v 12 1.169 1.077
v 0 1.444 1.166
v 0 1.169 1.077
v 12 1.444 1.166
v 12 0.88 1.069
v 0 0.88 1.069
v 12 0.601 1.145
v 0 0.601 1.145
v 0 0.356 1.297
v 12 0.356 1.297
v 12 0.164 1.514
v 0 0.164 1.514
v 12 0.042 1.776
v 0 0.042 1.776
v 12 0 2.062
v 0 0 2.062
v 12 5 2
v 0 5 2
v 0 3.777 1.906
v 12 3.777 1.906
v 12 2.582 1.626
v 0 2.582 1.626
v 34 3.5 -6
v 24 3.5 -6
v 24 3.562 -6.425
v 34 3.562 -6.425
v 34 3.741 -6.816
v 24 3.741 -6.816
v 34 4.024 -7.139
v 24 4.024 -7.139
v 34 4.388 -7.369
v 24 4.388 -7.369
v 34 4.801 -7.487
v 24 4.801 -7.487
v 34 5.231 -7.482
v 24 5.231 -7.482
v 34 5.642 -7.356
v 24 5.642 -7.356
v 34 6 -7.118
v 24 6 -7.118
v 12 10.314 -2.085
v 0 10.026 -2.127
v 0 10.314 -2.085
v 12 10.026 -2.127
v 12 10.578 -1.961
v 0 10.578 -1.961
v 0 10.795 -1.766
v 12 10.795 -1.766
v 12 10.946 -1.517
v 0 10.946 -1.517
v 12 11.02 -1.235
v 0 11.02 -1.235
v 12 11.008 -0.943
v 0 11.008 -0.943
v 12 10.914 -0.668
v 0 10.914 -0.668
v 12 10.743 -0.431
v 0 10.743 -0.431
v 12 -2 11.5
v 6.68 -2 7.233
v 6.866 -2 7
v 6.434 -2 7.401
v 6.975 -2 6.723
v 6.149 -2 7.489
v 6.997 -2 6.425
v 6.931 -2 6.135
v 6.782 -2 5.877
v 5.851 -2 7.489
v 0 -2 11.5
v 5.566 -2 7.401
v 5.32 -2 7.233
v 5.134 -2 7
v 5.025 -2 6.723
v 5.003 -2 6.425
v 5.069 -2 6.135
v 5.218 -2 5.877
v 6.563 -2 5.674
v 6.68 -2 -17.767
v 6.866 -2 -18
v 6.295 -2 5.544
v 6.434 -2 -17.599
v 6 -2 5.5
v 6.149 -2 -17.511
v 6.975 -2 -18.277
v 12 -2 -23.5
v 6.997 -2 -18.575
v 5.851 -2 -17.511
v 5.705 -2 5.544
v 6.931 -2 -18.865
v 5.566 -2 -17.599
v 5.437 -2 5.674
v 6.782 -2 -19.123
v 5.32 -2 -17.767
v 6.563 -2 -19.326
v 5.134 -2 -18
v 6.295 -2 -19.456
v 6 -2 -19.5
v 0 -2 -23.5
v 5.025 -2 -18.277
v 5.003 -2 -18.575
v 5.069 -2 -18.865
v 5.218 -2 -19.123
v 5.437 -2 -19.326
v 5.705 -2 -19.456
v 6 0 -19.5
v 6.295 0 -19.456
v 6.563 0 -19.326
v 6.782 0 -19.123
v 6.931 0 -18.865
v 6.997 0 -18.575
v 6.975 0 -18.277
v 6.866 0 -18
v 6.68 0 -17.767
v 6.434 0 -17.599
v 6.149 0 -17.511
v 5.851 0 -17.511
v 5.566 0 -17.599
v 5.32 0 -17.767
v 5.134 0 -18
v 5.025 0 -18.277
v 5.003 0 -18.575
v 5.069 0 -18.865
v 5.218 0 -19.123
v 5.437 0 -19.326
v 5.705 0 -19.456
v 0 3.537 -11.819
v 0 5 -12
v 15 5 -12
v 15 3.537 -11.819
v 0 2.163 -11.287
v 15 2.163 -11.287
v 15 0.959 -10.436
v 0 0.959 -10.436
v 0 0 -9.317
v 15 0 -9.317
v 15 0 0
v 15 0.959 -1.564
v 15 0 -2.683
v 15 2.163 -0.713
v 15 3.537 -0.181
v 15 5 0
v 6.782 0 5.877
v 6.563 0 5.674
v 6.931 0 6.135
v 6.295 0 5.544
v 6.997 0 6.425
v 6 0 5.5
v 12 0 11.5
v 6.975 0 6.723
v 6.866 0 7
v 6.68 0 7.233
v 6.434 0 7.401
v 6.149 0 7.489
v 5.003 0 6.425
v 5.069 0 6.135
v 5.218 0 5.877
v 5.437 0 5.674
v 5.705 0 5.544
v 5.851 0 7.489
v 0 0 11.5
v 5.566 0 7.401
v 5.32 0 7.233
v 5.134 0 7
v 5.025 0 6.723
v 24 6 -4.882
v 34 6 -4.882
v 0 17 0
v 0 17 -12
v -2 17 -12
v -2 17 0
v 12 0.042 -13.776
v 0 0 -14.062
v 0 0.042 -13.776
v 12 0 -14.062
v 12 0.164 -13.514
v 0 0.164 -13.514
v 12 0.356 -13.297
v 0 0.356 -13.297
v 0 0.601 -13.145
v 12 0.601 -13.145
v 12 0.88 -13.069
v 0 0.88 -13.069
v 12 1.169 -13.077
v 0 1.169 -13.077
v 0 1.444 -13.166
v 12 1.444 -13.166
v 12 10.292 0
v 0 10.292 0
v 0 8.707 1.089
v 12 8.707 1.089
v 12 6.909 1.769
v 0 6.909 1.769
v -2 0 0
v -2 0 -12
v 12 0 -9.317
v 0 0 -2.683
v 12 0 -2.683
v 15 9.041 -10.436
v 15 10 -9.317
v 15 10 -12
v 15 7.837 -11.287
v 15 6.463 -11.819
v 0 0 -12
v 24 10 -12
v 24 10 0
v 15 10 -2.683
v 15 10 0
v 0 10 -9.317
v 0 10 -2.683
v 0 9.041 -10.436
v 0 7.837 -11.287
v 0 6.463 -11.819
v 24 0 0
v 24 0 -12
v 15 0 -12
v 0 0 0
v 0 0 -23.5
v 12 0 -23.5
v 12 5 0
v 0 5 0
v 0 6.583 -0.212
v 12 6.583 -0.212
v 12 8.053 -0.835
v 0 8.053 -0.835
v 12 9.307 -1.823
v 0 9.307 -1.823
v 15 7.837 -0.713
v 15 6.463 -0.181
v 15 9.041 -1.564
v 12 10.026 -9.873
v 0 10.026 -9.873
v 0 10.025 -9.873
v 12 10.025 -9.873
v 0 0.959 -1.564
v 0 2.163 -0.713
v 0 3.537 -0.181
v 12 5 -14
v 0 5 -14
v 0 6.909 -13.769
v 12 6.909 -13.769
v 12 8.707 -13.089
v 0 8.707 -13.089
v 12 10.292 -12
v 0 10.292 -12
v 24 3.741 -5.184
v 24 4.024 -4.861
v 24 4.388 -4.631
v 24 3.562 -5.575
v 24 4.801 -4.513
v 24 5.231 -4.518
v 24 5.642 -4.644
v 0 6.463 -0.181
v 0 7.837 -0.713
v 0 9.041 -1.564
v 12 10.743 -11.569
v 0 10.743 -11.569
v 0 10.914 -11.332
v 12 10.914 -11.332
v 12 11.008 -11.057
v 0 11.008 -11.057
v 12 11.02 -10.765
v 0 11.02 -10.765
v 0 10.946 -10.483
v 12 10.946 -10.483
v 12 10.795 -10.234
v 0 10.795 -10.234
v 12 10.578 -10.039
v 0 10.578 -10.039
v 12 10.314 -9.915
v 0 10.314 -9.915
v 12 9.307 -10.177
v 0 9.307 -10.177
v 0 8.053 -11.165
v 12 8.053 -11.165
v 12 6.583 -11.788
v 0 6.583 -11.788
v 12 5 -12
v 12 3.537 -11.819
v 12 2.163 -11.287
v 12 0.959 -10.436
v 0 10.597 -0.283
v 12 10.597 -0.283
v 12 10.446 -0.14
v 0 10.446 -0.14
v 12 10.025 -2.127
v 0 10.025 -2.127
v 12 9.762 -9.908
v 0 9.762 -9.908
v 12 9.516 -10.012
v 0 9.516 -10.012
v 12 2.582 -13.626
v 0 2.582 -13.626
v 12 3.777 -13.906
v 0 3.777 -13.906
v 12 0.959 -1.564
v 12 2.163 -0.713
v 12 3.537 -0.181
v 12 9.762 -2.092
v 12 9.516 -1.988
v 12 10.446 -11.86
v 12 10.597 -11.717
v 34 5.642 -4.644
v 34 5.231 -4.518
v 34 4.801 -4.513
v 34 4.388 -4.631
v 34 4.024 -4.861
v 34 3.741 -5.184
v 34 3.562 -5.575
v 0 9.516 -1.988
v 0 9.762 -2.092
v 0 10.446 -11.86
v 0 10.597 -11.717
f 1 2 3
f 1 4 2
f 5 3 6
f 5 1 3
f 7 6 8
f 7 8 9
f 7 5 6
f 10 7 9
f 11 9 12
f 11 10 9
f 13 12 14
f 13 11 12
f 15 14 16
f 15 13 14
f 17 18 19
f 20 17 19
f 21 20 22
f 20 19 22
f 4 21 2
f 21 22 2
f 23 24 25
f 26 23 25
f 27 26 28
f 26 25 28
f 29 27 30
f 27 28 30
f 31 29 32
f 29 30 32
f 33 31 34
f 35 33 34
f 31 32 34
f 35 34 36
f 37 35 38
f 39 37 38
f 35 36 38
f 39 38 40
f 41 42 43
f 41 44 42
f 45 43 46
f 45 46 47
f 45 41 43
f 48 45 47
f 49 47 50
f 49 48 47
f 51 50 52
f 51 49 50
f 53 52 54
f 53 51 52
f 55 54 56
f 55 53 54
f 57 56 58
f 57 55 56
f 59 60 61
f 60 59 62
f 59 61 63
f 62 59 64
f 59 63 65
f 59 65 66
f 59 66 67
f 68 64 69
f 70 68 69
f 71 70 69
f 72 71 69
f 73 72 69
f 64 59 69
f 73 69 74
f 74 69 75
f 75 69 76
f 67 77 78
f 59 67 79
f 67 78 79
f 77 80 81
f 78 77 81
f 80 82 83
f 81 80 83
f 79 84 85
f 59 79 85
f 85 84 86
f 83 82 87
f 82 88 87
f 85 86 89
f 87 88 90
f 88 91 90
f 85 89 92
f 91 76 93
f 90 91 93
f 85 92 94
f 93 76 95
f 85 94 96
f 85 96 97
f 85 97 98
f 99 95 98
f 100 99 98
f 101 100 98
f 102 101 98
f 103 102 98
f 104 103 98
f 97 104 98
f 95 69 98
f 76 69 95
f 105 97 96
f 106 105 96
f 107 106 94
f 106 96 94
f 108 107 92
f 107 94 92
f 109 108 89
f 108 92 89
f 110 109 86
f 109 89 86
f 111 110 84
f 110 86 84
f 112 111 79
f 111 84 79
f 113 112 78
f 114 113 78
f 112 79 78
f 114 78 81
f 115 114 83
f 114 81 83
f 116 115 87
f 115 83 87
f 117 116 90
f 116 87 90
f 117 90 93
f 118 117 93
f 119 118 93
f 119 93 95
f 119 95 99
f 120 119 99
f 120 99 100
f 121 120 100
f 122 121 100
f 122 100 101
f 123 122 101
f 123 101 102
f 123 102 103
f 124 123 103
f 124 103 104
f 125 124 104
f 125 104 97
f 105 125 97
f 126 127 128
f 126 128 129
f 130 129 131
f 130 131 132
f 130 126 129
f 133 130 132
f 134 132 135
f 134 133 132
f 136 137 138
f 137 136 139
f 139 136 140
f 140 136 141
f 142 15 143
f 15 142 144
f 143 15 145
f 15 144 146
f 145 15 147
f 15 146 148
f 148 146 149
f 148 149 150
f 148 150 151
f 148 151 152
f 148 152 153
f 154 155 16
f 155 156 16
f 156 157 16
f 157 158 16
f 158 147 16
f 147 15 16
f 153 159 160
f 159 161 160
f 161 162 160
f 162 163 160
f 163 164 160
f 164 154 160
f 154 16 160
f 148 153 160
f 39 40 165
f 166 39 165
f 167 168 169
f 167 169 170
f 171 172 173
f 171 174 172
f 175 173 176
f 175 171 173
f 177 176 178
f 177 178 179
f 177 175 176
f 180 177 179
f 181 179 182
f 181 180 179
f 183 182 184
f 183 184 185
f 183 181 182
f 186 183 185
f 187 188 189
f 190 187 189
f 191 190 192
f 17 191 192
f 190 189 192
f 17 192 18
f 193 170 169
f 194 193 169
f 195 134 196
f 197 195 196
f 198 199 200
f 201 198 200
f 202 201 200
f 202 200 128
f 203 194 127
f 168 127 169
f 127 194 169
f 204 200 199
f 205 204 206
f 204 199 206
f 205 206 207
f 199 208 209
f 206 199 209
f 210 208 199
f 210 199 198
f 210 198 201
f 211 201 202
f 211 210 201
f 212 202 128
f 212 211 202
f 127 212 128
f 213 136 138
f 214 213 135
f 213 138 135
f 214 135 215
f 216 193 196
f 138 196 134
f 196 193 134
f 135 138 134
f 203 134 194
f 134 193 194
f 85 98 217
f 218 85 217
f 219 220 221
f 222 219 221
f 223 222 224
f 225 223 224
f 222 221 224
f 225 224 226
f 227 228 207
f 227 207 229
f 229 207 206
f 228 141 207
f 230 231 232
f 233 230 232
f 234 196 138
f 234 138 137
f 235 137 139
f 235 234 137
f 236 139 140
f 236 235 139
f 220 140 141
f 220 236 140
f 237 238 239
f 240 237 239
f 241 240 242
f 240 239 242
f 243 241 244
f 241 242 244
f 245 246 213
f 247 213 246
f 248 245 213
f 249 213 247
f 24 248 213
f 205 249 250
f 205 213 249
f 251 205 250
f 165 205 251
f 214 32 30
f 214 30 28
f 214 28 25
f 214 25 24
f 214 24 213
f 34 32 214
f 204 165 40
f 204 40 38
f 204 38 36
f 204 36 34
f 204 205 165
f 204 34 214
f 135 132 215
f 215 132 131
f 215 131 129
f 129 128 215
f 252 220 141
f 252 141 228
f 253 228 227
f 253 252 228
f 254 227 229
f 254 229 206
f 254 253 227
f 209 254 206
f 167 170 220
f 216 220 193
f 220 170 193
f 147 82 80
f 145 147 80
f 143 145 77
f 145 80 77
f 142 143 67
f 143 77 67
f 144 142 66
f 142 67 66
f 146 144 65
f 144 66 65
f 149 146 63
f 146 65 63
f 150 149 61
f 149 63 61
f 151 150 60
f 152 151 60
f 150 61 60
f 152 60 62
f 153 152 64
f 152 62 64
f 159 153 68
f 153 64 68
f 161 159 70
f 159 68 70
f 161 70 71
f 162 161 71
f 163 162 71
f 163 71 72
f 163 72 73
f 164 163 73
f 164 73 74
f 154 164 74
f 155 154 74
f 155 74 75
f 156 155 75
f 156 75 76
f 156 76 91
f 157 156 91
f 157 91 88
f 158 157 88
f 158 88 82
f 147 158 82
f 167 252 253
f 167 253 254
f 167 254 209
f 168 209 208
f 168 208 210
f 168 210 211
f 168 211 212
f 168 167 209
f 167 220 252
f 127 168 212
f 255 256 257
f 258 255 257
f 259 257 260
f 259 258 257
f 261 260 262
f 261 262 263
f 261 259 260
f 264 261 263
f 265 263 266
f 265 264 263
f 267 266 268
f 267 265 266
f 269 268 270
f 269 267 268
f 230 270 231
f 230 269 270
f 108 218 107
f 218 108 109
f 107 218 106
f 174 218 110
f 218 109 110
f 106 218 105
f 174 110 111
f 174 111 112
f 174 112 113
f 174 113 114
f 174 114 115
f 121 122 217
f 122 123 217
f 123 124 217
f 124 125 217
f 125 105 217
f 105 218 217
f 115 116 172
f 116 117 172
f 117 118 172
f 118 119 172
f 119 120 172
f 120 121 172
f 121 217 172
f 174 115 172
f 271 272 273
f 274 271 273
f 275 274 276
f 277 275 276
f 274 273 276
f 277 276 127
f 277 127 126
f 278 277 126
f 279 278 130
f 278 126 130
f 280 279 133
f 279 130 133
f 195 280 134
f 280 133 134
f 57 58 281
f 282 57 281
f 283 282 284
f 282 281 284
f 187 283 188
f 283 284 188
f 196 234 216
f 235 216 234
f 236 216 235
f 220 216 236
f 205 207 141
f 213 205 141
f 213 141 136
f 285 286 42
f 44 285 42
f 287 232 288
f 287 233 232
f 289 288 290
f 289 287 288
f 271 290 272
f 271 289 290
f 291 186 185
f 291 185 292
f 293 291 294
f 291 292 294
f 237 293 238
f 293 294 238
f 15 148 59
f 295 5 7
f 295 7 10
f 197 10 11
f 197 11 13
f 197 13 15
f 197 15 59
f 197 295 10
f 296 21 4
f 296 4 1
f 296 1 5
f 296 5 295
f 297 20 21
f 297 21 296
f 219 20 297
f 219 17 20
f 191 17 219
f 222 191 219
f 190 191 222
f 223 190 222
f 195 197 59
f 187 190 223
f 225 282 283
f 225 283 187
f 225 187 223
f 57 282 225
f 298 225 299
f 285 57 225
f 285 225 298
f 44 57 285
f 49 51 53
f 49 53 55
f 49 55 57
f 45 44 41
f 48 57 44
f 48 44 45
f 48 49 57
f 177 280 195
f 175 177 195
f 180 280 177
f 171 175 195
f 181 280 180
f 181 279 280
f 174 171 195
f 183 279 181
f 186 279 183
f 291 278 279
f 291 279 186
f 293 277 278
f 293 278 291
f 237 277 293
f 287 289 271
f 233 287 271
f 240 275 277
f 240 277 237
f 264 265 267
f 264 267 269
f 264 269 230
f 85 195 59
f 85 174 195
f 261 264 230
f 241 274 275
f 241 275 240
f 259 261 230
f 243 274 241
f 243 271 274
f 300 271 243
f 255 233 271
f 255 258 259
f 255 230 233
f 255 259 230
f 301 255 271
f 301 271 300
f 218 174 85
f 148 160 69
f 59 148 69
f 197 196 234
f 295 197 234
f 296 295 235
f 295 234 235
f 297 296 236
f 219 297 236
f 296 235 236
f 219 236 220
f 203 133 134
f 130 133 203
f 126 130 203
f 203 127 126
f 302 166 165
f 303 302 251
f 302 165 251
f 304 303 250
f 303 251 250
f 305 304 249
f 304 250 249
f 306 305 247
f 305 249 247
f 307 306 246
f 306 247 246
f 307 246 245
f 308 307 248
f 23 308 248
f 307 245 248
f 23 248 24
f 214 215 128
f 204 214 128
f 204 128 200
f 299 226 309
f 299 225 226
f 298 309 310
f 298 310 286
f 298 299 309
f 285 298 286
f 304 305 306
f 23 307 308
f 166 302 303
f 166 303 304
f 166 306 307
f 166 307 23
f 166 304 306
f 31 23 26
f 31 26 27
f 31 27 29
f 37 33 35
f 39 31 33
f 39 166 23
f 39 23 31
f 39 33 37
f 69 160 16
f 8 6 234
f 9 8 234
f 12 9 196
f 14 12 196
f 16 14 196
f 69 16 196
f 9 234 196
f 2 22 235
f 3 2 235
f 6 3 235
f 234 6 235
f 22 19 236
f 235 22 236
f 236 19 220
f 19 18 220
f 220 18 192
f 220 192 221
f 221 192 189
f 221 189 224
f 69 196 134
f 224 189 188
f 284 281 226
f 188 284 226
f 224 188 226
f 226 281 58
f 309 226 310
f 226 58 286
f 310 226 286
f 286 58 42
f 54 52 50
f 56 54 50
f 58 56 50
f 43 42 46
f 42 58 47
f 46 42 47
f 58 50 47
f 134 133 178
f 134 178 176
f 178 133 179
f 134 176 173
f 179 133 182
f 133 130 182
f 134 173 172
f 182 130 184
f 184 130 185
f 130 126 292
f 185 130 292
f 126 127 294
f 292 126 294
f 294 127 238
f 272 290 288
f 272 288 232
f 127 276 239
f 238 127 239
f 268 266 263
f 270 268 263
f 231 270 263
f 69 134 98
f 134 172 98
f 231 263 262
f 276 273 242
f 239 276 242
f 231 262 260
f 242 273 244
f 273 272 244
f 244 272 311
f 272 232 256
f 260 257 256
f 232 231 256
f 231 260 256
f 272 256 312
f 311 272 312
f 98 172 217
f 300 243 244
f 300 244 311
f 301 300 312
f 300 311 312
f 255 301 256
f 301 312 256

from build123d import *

# Parameters (mm, degrees)
BOSS_EXTRUDE1_DEPTH = 2
BOSS_EXTRUDE2_DEPTH = 24
CUT_EXTRUDE1_DEPTH  = 15
BOSS_EXTRUDE3_DEPTH = 34
BOSS_EXTRUDE4_DEPTH = 12
SKETCH3_R           = 1
CUT_EXTRUDE2_DEPTH  = 13
FILLET1_R           = 1


with BuildPart() as part:
    # Sketch1 → Boss-Extrude1 (new body)
    with BuildSketch(Plane(origin=(0, 0, 0), x_dir=(0, 0, -1), z_dir=(1, 0, 0))):
        Polygon((0, 17), (0, 10), (2.68337521, 10), (6, 10), (9.31662479, 10), (12, 10), (12, 17), align=None)
        with BuildLine():
            Line((2.68337521, 10), (0, 10))
            Line((0, 10), (0, 5.000000026))
            ThreePointArc((0, 5.000000026), (0.713235932, 7.837274342), (2.68337521, 10))
        make_face()
        with BuildLine():
            Line((9.31662479, 10), (6, 10))
            Line((6, 10), (6, 6))
            Line((6, 6), (7.118033989, 6))
            ThreePointArc((7.118033989, 6), (7.369306394, 4.387627564), (6, 3.5))
            Line((6, 3.5), (6, 0))
            Line((6, 0), (9.31662479, 0))
            ThreePointArc((9.31662479, 0), (11.286764069, 2.16272566), (12, 4.999999979))
            ThreePointArc((12, 4.999999979), (11.286764079, 7.837274322), (9.31662479, 10))
        make_face()
        with BuildLine():
            Line((12, 10), (9.31662479, 10))
            ThreePointArc((9.31662479, 10), (11.286764079, 7.837274322), (12, 4.999999979))
            Line((12, 4.999999979), (12, 10))
        make_face()
        with BuildLine():
            Line((12, 0), (12, 4.999999979))
            ThreePointArc((12, 4.999999979), (11.286764069, 2.16272566), (9.31662479, 0))
            Line((9.31662479, 0), (12, 0))
        make_face()
        with BuildLine():
            ThreePointArc((2.68337521, 0), (0.71323592, 2.16272568), (0, 5.000000026))
            Line((0, 5.000000026), (0, 0))
            Line((0, 0), (2.68337521, 0))
        make_face()
        with BuildLine():
            Line((6, 10), (2.68337521, 10))
            ThreePointArc((2.68337521, 10), (0.713235932, 7.837274342), (0, 5.000000026))
            ThreePointArc((0, 5.000000026), (0.71323592, 2.16272568), (2.68337521, 0))
            Line((2.68337521, 0), (6, 0))
            Line((6, 0), (6, 3.5))
            ThreePointArc((6, 3.5), (4.630693606, 4.387627564), (4.881966011, 6))
            Line((4.881966011, 6), (6, 6))
            Line((6, 6), (6, 10))
        make_face()
        with BuildLine():
            Line((7.118033989, 6), (6, 6))
            Line((6, 6), (6, 3.5))
            ThreePointArc((6, 3.5), (7.369306394, 4.387627564), (7.118033989, 6))
        make_face()
        with BuildLine():
            Line((6, 3.5), (6, 6))
            Line((6, 6), (4.881966011, 6))
            ThreePointArc((4.881966011, 6), (4.630693606, 4.387627564), (6, 3.5))
        make_face()
    extrude(amount=-BOSS_EXTRUDE1_DEPTH)

    # Sketch1<3> → Boss-Extrude2 (add)
    with BuildSketch(Plane(origin=(0, 0, 0), x_dir=(0, 0, -1), z_dir=(1, 0, 0))):
        with BuildLine():
            Line((9.31662479, 10), (6, 10))
            Line((6, 10), (6, 6))
            Line((6, 6), (7.118033989, 6))
            ThreePointArc((7.118033989, 6), (7.369306394, 4.387627564), (6, 3.5))
            Line((6, 3.5), (6, 0))
            Line((6, 0), (9.31662479, 0))
            ThreePointArc((9.31662479, 0), (11.286764069, 2.16272566), (12, 4.999999979))
            ThreePointArc((12, 4.999999979), (11.286764079, 7.837274322), (9.31662479, 10))
        make_face()
        with BuildLine():
            Line((12, 10), (9.31662479, 10))
            ThreePointArc((9.31662479, 10), (11.286764079, 7.837274322), (12, 4.999999979))
            Line((12, 4.999999979), (12, 10))
        make_face()
        with BuildLine():
            Line((12, 0), (12, 4.999999979))
            ThreePointArc((12, 4.999999979), (11.286764069, 2.16272566), (9.31662479, 0))
            Line((9.31662479, 0), (12, 0))
        make_face()
        with BuildLine():
            Line((6, 10), (2.68337521, 10))
            ThreePointArc((2.68337521, 10), (0.713235932, 7.837274342), (0, 5.000000026))
            ThreePointArc((0, 5.000000026), (0.71323592, 2.16272568), (2.68337521, 0))
            Line((2.68337521, 0), (6, 0))
            Line((6, 0), (6, 3.5))
            ThreePointArc((6, 3.5), (4.630693606, 4.387627564), (4.881966011, 6))
            Line((4.881966011, 6), (6, 6))
            Line((6, 6), (6, 10))
        make_face()
        with BuildLine():
            ThreePointArc((2.68337521, 0), (0.71323592, 2.16272568), (0, 5.000000026))
            Line((0, 5.000000026), (0, 0))
            Line((0, 0), (2.68337521, 0))
        make_face()
        with BuildLine():
            Line((2.68337521, 10), (0, 10))
            Line((0, 10), (0, 5.000000026))
            ThreePointArc((0, 5.000000026), (0.713235932, 7.837274342), (2.68337521, 10))
        make_face()
        with BuildLine():
            Line((7.118033989, 6), (6, 6))
            Line((6, 6), (6, 3.5))
            ThreePointArc((6, 3.5), (7.369306394, 4.387627564), (7.118033989, 6))
        make_face()
        with BuildLine():
            Line((6, 3.5), (6, 6))
            Line((6, 6), (4.881966011, 6))
            ThreePointArc((4.881966011, 6), (4.630693606, 4.387627564), (6, 3.5))
        make_face()
    extrude(amount=BOSS_EXTRUDE2_DEPTH)

    # Sketch1<4> → Cut-Extrude1 (cut)
    with BuildSketch(Plane(origin=(0, 0, 0), x_dir=(0, 0, -1), z_dir=(1, 0, 0))):
        with BuildLine():
            Line((12, 10), (9.31662479, 10))
            ThreePointArc((9.31662479, 10), (11.286764079, 7.837274322), (12, 4.999999979))
            Line((12, 4.999999979), (12, 10))
        make_face()
        with BuildLine():
            Line((2.68337521, 10), (0, 10))
            Line((0, 10), (0, 5.000000026))
            ThreePointArc((0, 5.000000026), (0.713235932, 7.837274342), (2.68337521, 10))
        make_face()
        with BuildLine():
            ThreePointArc((2.68337521, 0), (0.71323592, 2.16272568), (0, 5.000000026))
            Line((0, 5.000000026), (0, 0))
            Line((0, 0), (2.68337521, 0))
        make_face()
        with BuildLine():
            Line((12, 0), (12, 4.999999979))
            ThreePointArc((12, 4.999999979), (11.286764069, 2.16272566), (9.31662479, 0))
            Line((9.31662479, 0), (12, 0))
        make_face()
    extrude(amount=CUT_EXTRUDE1_DEPTH, mode=Mode.SUBTRACT)

    # Sketch1<5> → Boss-Extrude3 (add)
    with BuildSketch(Plane(origin=(0, 0, 0), x_dir=(0, 0, -1), z_dir=(1, 0, 0))):
        with BuildLine():
            Line((7.118033989, 6), (6, 6))
            Line((6, 6), (6, 3.5))
            ThreePointArc((6, 3.5), (7.369306394, 4.387627564), (7.118033989, 6))
        make_face()
        with BuildLine():
            Line((6, 3.5), (6, 6))
            Line((6, 6), (4.881966011, 6))
            ThreePointArc((4.881966011, 6), (4.630693606, 4.387627564), (6, 3.5))
        make_face()
    extrude(amount=BOSS_EXTRUDE3_DEPTH)


with BuildPart() as body_2:
    # Sketch2 → Boss-Extrude4 (new body)
    with BuildSketch(Plane(origin=(0, 0, 0), x_dir=(0, 0, -1), z_dir=(1, 0, 0))):
        with BuildLine():
            Line((0, 10.291502622), (0, 5))
            ThreePointArc((0, 5), (0.557670532, 7.526074021), (2.127016654, 9.582575695))
            Line((2.127016654, 9.582575695), (2.127016654, 12))
            ThreePointArc((2.127016654, 12), (0.990140635, 11.237091401), (0, 10.291502622))
        make_face()
        with BuildLine():
            Line((9.31662479, 0), (2.68337521, 0))
            ThreePointArc((2.68337521, 0), (0.713235926, 2.162725669), (0, 5))
            Line((0, 5), (0, 10.291502622))
            ThreePointArc((0, 10.291502622), (-1.483314774, 7.828427125), (-2, 5))
            ThreePointArc((-2, 5), (-1.548509256, 2.350470229), (-0.244997998, 0))
            Line((-0.244997998, 0), (-11.5, 0))
            Line((-11.5, 0), (-11.5, -2))
            Line((-11.5, -2), (23.5, -2))
            Line((23.5, -2), (23.5, 0))
            Line((23.5, 0), (12.244997998, 0))
            ThreePointArc((12.244997998, 0), (13.548509256, 2.350470229), (14, 5))
            ThreePointArc((14, 5), (13.483314774, 7.828427125), (12, 10.291502622))
            Line((12, 10.291502622), (12, 5))
            ThreePointArc((12, 5), (11.286764074, 2.162725669), (9.31662479, 0))
        make_face()
        with BuildLine():
            ThreePointArc((9.872983346, 9.582575695), (11.442329468, 7.526074021), (12, 5))
            Line((12, 5), (12, 10.291502622))
            ThreePointArc((12, 10.291502622), (11.009859365, 11.237091401), (9.872983346, 12))
            Line((9.872983346, 12), (9.872983346, 9.582575695))
        make_face()
    extrude(amount=BOSS_EXTRUDE4_DEPTH)

    # Sketch3 → Cut-Extrude2 (cut)
    with BuildSketch(Plane.XZ.offset(2)):
        with Locations(Location((6, 6.5, 0), (0, 0, 270))):
            Circle(SKETCH3_R)
        with Locations(Location((6, -18.5, 0), (0, 0, 270))):
            Circle(SKETCH3_R)
    extrude(amount=-CUT_EXTRUDE2_DEPTH, mode=Mode.SUBTRACT)

    # Fillet1
    fillet1_edges = [body_2.edges().sort_by_distance(p)[0] for p in [
        (6, 0, -12.244997998),
        (6, 0, 0.244997998),
        (6, 9.582575695, -2.127016654),
        (6, 9.582575695, -9.872983346),
        (6, 12, -9.872983346),
        (6, 12, -2.127016654),
    ]]
    fillet(fillet1_edges, radius=FILLET1_R - 0.0001)  # a hair under: the kernel refuses the full size


solid = Compound([part.part, body_2.part])
